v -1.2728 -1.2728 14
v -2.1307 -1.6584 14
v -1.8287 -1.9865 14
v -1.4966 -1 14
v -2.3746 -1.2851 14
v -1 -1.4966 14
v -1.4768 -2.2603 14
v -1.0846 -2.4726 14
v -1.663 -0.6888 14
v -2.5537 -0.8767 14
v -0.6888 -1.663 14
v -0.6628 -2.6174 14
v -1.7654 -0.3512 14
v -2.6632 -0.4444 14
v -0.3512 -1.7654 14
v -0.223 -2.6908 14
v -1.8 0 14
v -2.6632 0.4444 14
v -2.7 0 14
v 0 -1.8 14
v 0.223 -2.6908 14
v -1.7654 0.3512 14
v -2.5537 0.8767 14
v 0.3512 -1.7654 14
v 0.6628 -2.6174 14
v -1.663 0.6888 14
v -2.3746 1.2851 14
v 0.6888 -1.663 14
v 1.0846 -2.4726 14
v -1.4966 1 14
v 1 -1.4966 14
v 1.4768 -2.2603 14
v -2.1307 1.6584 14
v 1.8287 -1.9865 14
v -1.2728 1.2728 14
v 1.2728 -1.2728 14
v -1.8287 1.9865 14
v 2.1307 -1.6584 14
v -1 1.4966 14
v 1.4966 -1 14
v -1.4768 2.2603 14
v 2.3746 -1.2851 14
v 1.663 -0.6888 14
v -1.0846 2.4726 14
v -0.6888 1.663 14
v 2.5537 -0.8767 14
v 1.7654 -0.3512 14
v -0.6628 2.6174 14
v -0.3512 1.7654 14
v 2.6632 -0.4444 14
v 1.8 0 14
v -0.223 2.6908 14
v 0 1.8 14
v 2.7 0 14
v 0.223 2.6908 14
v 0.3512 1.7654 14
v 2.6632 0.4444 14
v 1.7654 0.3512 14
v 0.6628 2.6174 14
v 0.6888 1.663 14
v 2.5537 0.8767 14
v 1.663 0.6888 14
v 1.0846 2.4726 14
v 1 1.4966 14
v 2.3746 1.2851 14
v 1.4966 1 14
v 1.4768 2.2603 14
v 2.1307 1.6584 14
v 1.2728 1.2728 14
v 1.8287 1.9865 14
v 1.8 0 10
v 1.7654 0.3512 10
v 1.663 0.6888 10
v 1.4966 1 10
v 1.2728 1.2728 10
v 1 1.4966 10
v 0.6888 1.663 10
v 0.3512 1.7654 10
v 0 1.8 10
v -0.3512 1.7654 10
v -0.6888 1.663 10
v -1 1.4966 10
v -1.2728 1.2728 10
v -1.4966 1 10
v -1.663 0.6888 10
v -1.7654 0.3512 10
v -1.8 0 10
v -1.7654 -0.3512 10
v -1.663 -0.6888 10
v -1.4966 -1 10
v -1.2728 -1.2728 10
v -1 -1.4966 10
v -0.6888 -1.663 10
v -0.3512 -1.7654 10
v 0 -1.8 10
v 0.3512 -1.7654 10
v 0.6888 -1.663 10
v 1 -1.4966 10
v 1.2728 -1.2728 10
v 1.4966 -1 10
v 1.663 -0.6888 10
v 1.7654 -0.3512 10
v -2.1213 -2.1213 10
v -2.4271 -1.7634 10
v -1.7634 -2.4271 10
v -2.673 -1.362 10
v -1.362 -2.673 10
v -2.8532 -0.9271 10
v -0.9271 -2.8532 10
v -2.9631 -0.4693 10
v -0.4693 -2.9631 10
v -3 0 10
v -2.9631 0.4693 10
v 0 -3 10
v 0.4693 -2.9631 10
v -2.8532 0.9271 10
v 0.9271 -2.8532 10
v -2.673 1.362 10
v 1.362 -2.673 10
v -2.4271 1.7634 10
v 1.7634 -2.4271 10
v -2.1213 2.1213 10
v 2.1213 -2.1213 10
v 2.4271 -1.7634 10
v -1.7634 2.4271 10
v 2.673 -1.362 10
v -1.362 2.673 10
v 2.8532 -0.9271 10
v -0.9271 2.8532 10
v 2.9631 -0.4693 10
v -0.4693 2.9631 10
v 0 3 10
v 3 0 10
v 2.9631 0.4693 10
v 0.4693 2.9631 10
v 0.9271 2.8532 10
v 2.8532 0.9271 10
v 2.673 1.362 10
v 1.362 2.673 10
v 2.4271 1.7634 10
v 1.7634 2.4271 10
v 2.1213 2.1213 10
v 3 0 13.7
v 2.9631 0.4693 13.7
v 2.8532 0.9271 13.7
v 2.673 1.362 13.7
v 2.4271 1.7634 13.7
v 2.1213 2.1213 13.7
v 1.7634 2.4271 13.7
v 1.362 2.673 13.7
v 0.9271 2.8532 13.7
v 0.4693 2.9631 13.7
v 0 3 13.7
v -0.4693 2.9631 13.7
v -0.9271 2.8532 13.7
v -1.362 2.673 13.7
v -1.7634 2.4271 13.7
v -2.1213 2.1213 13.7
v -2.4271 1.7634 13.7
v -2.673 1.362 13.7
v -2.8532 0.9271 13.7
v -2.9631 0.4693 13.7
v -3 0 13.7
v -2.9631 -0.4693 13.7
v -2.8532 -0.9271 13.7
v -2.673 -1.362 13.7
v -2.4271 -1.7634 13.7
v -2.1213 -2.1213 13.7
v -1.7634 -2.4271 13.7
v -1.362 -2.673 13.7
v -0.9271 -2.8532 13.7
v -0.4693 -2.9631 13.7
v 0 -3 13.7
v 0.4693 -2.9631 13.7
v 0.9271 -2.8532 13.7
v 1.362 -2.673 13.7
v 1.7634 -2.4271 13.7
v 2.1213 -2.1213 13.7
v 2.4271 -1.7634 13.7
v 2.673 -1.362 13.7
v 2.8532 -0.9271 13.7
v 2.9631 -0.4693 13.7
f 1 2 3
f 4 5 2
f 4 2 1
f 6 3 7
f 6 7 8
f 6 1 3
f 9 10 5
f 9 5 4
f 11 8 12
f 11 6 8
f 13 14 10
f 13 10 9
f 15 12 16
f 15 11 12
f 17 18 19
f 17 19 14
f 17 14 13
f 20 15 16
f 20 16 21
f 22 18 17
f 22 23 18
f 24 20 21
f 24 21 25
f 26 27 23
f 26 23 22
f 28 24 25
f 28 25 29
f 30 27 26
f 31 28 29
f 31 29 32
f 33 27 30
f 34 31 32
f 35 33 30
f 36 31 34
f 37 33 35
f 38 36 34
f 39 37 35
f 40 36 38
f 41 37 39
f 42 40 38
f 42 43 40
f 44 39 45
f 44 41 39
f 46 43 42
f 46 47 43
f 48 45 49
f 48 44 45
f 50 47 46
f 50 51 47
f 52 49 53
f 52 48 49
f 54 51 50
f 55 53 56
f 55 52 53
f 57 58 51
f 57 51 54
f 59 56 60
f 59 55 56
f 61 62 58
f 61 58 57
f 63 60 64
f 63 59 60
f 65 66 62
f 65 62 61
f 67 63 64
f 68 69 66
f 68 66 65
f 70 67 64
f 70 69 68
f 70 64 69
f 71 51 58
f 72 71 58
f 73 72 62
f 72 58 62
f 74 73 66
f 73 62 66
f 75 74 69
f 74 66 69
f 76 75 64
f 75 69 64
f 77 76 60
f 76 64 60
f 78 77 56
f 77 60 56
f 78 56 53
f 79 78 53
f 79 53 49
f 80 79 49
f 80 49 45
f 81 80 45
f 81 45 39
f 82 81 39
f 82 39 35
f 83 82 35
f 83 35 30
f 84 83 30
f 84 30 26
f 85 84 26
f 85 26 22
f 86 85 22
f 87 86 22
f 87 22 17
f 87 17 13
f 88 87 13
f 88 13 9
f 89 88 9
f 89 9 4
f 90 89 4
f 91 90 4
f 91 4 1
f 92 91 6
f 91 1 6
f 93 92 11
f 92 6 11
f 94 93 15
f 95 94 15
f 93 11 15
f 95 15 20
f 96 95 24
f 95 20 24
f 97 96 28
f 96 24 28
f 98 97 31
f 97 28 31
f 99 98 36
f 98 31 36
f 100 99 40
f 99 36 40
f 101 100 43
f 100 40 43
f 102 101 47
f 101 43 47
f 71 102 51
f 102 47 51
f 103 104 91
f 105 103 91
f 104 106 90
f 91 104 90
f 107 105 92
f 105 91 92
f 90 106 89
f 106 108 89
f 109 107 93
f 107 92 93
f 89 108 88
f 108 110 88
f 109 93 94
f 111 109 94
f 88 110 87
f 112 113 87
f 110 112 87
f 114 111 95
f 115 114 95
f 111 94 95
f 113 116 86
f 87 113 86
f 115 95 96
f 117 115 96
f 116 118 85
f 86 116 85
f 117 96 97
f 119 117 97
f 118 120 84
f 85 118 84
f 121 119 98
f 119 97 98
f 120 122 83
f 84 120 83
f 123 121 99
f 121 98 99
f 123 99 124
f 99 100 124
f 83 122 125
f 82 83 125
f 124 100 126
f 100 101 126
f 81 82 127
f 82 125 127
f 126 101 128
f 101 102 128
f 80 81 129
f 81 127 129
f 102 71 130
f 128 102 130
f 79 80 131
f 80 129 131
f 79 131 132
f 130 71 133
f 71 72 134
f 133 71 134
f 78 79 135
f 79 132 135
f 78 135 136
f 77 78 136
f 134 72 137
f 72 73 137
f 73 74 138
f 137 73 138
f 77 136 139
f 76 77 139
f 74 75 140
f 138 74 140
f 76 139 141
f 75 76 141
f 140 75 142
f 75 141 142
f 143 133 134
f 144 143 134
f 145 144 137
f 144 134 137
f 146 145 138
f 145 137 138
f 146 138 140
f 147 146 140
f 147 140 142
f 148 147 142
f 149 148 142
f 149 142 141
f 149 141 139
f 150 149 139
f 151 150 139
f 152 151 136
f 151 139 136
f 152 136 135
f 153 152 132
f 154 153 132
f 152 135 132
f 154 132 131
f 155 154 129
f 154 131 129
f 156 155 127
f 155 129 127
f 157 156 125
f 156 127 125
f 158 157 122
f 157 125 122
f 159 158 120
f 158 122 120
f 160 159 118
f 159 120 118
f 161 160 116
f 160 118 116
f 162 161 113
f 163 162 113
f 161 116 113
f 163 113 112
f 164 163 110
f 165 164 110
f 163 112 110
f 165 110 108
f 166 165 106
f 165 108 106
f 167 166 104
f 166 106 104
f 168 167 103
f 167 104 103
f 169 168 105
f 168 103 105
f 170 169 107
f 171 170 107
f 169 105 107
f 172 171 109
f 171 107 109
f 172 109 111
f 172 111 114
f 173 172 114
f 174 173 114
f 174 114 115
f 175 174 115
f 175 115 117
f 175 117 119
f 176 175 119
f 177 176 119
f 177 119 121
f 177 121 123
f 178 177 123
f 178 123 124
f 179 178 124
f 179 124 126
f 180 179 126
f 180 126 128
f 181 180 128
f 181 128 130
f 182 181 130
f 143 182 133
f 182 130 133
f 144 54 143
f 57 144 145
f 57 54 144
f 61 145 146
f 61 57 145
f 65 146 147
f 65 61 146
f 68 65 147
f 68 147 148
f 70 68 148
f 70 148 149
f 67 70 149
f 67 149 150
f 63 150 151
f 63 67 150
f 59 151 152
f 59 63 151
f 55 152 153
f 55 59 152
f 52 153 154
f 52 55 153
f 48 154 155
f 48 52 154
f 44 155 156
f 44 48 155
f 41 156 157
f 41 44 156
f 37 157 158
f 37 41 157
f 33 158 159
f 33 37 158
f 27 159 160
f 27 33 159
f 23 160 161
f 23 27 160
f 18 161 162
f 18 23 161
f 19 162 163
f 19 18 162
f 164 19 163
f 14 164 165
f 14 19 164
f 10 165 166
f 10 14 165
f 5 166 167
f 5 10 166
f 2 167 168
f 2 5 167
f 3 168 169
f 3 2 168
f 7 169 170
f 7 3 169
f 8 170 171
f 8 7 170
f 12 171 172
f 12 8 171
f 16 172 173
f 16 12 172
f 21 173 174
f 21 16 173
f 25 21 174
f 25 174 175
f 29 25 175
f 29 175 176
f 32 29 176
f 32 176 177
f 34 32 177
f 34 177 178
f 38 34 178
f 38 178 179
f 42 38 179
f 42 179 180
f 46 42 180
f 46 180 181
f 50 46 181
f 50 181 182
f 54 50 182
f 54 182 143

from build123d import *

# Parameters (mm, degrees)
SKETCH016_R     = 3
PAD007_DEPTH    = 4
SKETCH023_R     = 1.8
POCKET007_DEPTH = 6
CHAMFER001_SIZE = 0.3


with BuildPart() as part:
    # Sketch016 → Pad007 (new body)
    with BuildSketch(Plane.XY.offset(11)):
        Circle(SKETCH016_R)
    extrude(amount=PAD007_DEPTH)

    # Sketch023 (on Face3 of Pad007) → Pocket007 (cut)
    with BuildSketch(Plane.XY.offset(15)):
        Circle(SKETCH023_R)
    extrude(amount=-POCKET007_DEPTH, mode=Mode.SUBTRACT)

    # Chamfer001
    chamfer001_edges = [part.edges().sort_by_distance(p)[0] for p in [
        (-3, 0, 15),
    ]]
    chamfer(chamfer001_edges, length=CHAMFER001_SIZE)


with BuildPart() as part_1:
    # Body002 placement: moved
    add(part.part.moved(Location((0, 0, -1))))


solid = part_1.part
